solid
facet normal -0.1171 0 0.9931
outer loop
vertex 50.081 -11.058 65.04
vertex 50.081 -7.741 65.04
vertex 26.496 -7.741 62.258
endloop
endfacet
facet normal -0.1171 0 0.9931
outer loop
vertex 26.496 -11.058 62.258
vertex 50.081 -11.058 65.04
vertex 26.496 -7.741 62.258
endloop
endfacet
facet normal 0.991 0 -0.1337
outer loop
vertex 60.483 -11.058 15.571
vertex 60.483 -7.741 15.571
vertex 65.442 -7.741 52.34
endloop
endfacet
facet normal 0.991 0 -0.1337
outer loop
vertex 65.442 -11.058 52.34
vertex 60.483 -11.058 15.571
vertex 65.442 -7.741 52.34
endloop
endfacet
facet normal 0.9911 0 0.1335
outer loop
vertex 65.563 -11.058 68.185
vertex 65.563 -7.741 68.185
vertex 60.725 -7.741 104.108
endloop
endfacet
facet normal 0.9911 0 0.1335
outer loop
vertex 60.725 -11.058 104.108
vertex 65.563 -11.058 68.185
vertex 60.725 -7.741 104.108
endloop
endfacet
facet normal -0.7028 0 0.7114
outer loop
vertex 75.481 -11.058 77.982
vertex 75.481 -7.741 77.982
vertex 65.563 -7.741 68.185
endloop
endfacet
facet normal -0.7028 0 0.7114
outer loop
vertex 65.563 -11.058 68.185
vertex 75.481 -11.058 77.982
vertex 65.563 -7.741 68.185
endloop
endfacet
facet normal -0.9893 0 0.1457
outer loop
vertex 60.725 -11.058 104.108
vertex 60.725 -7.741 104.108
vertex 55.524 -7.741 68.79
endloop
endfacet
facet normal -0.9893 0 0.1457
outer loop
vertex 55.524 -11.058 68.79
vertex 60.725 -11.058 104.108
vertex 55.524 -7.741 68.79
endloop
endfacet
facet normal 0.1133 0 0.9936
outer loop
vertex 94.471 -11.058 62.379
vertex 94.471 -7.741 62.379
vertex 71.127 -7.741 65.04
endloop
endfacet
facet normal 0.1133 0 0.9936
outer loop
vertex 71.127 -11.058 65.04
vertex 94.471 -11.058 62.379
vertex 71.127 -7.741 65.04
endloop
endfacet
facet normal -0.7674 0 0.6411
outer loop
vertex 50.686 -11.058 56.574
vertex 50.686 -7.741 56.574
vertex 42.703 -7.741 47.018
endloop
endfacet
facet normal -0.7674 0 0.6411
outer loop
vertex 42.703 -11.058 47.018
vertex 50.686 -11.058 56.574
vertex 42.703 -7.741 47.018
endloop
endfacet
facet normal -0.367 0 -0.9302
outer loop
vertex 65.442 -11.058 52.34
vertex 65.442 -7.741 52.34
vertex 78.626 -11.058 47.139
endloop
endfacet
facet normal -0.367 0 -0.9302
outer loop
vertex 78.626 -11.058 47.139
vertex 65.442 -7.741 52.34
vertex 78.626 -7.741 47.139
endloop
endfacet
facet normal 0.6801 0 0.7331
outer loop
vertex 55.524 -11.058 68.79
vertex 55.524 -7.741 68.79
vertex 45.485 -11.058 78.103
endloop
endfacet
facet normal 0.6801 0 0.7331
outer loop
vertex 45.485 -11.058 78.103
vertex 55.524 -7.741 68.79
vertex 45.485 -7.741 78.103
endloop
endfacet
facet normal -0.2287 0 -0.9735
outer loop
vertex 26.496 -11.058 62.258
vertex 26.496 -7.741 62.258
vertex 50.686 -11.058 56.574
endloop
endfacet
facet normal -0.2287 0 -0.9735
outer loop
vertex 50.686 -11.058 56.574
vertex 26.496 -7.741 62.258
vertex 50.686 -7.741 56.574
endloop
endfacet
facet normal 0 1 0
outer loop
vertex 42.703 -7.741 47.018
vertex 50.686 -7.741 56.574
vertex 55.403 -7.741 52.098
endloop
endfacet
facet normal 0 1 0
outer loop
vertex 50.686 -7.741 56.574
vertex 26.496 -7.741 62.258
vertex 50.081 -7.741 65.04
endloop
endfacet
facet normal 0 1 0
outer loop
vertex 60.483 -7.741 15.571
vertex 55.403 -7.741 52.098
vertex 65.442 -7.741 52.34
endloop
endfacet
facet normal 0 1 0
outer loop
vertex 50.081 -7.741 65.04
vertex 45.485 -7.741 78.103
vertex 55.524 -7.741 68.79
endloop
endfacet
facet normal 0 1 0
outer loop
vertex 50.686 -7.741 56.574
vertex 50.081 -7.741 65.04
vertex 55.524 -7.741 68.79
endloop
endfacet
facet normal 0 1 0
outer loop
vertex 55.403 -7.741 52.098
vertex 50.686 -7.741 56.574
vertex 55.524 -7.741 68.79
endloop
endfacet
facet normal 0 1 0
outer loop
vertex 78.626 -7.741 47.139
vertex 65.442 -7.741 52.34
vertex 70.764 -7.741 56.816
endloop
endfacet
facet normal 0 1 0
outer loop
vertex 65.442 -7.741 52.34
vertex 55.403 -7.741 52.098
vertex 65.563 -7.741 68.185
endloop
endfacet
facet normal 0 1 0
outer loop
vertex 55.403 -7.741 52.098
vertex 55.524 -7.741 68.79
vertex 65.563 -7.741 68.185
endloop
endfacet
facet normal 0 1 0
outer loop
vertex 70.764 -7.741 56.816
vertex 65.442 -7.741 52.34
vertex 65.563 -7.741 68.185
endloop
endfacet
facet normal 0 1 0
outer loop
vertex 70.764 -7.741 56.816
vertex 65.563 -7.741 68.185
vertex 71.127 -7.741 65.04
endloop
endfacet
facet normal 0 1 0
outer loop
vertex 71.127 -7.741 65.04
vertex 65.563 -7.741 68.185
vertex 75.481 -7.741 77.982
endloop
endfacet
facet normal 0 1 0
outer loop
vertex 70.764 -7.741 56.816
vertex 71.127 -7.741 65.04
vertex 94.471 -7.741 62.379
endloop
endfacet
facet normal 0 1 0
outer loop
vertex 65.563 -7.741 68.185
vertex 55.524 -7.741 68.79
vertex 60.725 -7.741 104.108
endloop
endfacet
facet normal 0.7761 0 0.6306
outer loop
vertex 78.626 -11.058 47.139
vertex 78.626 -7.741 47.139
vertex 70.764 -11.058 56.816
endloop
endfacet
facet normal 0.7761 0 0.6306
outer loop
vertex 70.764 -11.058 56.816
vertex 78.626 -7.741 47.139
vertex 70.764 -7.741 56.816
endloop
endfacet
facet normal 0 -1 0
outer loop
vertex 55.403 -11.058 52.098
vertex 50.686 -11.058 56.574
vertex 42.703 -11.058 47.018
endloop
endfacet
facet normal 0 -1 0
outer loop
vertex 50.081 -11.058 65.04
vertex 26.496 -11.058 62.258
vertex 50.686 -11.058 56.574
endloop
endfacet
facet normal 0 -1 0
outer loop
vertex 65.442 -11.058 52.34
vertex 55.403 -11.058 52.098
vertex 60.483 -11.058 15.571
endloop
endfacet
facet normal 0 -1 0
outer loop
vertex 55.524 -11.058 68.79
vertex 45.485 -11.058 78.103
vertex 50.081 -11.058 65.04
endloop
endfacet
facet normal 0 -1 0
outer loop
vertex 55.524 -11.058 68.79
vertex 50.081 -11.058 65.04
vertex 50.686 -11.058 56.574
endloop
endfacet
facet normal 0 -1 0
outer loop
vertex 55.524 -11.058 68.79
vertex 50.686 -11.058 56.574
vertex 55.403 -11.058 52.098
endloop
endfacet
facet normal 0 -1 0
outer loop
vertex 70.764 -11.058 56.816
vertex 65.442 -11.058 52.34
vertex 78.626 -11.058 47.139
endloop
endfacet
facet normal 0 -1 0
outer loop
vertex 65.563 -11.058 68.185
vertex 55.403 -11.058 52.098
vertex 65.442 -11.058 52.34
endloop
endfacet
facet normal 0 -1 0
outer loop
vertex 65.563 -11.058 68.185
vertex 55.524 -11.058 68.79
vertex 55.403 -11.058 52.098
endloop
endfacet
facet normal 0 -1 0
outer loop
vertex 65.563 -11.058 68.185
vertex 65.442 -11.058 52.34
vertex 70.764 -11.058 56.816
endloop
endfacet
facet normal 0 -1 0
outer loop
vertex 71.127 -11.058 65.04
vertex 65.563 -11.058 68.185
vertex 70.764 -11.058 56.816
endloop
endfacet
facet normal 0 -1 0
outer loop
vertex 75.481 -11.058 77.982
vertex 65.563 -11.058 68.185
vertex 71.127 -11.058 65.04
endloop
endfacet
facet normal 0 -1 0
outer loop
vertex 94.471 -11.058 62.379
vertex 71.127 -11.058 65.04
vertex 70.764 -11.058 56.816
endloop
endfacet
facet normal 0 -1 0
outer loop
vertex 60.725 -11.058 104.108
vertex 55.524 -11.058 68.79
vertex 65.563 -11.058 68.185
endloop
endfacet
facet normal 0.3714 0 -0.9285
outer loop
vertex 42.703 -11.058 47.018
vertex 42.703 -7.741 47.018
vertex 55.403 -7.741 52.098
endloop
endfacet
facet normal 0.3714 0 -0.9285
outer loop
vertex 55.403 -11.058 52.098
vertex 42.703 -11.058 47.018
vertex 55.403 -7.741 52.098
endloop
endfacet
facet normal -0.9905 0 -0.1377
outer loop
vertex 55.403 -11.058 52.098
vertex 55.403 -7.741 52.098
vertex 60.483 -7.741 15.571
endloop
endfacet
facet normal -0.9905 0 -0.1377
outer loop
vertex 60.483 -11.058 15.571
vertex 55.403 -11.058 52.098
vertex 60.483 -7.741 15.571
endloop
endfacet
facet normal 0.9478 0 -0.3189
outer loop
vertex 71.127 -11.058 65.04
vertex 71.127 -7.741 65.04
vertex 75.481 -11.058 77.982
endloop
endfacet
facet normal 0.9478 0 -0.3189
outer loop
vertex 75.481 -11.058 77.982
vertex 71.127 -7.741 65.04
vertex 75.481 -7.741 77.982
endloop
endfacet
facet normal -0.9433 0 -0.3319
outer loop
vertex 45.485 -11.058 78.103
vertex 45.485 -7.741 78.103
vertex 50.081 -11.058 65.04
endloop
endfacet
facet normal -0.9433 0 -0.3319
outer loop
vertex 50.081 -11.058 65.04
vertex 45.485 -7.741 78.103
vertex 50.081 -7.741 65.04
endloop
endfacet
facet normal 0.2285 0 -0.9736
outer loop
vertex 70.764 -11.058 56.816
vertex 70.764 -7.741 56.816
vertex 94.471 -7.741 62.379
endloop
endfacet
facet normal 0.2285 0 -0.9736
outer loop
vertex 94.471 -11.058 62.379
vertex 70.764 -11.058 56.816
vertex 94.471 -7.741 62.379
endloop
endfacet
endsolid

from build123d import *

# Parameters (mm, degrees)
F1_DEPTH = 11.0582
F2_SCALE = 0.3


with BuildPart() as f1:
    # F0 (on Front) → F1 (new body)
    with BuildSketch(Plane.XZ):
        Polygon((0.806323, 147.5619096), (-16.5301676, 29.8349162), (-49.993677, 60.879355), (-34.673032, 17.3364906), (-113.2920772, 8.063484), (-32.657161, -10.8857288), (-59.2666836, -42.736516), (-16.9333418, -25.8031742), (-2.54e-05, -147.5619096), (16.5301422, -24.9968258), (60.4761808, -42.3333418), (34.2698324, -10.0793804), (113.2920518, 8.4666582), (35.479355, 17.3364906), (49.9936262, 60.4761808), (16.9333164, 27.8190452), align=None)
    extrude(amount=F1_DEPTH)


with BuildPart() as f1_1:
    # F2: moved
    add(f1.part.scale(F2_SCALE).moved(Location((0.5644261, -7.74074, 103.29333672))))


with BuildPart() as f1_2:
    # F3: moved
    add(f1_1.part.moved(Location((59.91897, 0, -43.45396))))


solid = f1_2.part
